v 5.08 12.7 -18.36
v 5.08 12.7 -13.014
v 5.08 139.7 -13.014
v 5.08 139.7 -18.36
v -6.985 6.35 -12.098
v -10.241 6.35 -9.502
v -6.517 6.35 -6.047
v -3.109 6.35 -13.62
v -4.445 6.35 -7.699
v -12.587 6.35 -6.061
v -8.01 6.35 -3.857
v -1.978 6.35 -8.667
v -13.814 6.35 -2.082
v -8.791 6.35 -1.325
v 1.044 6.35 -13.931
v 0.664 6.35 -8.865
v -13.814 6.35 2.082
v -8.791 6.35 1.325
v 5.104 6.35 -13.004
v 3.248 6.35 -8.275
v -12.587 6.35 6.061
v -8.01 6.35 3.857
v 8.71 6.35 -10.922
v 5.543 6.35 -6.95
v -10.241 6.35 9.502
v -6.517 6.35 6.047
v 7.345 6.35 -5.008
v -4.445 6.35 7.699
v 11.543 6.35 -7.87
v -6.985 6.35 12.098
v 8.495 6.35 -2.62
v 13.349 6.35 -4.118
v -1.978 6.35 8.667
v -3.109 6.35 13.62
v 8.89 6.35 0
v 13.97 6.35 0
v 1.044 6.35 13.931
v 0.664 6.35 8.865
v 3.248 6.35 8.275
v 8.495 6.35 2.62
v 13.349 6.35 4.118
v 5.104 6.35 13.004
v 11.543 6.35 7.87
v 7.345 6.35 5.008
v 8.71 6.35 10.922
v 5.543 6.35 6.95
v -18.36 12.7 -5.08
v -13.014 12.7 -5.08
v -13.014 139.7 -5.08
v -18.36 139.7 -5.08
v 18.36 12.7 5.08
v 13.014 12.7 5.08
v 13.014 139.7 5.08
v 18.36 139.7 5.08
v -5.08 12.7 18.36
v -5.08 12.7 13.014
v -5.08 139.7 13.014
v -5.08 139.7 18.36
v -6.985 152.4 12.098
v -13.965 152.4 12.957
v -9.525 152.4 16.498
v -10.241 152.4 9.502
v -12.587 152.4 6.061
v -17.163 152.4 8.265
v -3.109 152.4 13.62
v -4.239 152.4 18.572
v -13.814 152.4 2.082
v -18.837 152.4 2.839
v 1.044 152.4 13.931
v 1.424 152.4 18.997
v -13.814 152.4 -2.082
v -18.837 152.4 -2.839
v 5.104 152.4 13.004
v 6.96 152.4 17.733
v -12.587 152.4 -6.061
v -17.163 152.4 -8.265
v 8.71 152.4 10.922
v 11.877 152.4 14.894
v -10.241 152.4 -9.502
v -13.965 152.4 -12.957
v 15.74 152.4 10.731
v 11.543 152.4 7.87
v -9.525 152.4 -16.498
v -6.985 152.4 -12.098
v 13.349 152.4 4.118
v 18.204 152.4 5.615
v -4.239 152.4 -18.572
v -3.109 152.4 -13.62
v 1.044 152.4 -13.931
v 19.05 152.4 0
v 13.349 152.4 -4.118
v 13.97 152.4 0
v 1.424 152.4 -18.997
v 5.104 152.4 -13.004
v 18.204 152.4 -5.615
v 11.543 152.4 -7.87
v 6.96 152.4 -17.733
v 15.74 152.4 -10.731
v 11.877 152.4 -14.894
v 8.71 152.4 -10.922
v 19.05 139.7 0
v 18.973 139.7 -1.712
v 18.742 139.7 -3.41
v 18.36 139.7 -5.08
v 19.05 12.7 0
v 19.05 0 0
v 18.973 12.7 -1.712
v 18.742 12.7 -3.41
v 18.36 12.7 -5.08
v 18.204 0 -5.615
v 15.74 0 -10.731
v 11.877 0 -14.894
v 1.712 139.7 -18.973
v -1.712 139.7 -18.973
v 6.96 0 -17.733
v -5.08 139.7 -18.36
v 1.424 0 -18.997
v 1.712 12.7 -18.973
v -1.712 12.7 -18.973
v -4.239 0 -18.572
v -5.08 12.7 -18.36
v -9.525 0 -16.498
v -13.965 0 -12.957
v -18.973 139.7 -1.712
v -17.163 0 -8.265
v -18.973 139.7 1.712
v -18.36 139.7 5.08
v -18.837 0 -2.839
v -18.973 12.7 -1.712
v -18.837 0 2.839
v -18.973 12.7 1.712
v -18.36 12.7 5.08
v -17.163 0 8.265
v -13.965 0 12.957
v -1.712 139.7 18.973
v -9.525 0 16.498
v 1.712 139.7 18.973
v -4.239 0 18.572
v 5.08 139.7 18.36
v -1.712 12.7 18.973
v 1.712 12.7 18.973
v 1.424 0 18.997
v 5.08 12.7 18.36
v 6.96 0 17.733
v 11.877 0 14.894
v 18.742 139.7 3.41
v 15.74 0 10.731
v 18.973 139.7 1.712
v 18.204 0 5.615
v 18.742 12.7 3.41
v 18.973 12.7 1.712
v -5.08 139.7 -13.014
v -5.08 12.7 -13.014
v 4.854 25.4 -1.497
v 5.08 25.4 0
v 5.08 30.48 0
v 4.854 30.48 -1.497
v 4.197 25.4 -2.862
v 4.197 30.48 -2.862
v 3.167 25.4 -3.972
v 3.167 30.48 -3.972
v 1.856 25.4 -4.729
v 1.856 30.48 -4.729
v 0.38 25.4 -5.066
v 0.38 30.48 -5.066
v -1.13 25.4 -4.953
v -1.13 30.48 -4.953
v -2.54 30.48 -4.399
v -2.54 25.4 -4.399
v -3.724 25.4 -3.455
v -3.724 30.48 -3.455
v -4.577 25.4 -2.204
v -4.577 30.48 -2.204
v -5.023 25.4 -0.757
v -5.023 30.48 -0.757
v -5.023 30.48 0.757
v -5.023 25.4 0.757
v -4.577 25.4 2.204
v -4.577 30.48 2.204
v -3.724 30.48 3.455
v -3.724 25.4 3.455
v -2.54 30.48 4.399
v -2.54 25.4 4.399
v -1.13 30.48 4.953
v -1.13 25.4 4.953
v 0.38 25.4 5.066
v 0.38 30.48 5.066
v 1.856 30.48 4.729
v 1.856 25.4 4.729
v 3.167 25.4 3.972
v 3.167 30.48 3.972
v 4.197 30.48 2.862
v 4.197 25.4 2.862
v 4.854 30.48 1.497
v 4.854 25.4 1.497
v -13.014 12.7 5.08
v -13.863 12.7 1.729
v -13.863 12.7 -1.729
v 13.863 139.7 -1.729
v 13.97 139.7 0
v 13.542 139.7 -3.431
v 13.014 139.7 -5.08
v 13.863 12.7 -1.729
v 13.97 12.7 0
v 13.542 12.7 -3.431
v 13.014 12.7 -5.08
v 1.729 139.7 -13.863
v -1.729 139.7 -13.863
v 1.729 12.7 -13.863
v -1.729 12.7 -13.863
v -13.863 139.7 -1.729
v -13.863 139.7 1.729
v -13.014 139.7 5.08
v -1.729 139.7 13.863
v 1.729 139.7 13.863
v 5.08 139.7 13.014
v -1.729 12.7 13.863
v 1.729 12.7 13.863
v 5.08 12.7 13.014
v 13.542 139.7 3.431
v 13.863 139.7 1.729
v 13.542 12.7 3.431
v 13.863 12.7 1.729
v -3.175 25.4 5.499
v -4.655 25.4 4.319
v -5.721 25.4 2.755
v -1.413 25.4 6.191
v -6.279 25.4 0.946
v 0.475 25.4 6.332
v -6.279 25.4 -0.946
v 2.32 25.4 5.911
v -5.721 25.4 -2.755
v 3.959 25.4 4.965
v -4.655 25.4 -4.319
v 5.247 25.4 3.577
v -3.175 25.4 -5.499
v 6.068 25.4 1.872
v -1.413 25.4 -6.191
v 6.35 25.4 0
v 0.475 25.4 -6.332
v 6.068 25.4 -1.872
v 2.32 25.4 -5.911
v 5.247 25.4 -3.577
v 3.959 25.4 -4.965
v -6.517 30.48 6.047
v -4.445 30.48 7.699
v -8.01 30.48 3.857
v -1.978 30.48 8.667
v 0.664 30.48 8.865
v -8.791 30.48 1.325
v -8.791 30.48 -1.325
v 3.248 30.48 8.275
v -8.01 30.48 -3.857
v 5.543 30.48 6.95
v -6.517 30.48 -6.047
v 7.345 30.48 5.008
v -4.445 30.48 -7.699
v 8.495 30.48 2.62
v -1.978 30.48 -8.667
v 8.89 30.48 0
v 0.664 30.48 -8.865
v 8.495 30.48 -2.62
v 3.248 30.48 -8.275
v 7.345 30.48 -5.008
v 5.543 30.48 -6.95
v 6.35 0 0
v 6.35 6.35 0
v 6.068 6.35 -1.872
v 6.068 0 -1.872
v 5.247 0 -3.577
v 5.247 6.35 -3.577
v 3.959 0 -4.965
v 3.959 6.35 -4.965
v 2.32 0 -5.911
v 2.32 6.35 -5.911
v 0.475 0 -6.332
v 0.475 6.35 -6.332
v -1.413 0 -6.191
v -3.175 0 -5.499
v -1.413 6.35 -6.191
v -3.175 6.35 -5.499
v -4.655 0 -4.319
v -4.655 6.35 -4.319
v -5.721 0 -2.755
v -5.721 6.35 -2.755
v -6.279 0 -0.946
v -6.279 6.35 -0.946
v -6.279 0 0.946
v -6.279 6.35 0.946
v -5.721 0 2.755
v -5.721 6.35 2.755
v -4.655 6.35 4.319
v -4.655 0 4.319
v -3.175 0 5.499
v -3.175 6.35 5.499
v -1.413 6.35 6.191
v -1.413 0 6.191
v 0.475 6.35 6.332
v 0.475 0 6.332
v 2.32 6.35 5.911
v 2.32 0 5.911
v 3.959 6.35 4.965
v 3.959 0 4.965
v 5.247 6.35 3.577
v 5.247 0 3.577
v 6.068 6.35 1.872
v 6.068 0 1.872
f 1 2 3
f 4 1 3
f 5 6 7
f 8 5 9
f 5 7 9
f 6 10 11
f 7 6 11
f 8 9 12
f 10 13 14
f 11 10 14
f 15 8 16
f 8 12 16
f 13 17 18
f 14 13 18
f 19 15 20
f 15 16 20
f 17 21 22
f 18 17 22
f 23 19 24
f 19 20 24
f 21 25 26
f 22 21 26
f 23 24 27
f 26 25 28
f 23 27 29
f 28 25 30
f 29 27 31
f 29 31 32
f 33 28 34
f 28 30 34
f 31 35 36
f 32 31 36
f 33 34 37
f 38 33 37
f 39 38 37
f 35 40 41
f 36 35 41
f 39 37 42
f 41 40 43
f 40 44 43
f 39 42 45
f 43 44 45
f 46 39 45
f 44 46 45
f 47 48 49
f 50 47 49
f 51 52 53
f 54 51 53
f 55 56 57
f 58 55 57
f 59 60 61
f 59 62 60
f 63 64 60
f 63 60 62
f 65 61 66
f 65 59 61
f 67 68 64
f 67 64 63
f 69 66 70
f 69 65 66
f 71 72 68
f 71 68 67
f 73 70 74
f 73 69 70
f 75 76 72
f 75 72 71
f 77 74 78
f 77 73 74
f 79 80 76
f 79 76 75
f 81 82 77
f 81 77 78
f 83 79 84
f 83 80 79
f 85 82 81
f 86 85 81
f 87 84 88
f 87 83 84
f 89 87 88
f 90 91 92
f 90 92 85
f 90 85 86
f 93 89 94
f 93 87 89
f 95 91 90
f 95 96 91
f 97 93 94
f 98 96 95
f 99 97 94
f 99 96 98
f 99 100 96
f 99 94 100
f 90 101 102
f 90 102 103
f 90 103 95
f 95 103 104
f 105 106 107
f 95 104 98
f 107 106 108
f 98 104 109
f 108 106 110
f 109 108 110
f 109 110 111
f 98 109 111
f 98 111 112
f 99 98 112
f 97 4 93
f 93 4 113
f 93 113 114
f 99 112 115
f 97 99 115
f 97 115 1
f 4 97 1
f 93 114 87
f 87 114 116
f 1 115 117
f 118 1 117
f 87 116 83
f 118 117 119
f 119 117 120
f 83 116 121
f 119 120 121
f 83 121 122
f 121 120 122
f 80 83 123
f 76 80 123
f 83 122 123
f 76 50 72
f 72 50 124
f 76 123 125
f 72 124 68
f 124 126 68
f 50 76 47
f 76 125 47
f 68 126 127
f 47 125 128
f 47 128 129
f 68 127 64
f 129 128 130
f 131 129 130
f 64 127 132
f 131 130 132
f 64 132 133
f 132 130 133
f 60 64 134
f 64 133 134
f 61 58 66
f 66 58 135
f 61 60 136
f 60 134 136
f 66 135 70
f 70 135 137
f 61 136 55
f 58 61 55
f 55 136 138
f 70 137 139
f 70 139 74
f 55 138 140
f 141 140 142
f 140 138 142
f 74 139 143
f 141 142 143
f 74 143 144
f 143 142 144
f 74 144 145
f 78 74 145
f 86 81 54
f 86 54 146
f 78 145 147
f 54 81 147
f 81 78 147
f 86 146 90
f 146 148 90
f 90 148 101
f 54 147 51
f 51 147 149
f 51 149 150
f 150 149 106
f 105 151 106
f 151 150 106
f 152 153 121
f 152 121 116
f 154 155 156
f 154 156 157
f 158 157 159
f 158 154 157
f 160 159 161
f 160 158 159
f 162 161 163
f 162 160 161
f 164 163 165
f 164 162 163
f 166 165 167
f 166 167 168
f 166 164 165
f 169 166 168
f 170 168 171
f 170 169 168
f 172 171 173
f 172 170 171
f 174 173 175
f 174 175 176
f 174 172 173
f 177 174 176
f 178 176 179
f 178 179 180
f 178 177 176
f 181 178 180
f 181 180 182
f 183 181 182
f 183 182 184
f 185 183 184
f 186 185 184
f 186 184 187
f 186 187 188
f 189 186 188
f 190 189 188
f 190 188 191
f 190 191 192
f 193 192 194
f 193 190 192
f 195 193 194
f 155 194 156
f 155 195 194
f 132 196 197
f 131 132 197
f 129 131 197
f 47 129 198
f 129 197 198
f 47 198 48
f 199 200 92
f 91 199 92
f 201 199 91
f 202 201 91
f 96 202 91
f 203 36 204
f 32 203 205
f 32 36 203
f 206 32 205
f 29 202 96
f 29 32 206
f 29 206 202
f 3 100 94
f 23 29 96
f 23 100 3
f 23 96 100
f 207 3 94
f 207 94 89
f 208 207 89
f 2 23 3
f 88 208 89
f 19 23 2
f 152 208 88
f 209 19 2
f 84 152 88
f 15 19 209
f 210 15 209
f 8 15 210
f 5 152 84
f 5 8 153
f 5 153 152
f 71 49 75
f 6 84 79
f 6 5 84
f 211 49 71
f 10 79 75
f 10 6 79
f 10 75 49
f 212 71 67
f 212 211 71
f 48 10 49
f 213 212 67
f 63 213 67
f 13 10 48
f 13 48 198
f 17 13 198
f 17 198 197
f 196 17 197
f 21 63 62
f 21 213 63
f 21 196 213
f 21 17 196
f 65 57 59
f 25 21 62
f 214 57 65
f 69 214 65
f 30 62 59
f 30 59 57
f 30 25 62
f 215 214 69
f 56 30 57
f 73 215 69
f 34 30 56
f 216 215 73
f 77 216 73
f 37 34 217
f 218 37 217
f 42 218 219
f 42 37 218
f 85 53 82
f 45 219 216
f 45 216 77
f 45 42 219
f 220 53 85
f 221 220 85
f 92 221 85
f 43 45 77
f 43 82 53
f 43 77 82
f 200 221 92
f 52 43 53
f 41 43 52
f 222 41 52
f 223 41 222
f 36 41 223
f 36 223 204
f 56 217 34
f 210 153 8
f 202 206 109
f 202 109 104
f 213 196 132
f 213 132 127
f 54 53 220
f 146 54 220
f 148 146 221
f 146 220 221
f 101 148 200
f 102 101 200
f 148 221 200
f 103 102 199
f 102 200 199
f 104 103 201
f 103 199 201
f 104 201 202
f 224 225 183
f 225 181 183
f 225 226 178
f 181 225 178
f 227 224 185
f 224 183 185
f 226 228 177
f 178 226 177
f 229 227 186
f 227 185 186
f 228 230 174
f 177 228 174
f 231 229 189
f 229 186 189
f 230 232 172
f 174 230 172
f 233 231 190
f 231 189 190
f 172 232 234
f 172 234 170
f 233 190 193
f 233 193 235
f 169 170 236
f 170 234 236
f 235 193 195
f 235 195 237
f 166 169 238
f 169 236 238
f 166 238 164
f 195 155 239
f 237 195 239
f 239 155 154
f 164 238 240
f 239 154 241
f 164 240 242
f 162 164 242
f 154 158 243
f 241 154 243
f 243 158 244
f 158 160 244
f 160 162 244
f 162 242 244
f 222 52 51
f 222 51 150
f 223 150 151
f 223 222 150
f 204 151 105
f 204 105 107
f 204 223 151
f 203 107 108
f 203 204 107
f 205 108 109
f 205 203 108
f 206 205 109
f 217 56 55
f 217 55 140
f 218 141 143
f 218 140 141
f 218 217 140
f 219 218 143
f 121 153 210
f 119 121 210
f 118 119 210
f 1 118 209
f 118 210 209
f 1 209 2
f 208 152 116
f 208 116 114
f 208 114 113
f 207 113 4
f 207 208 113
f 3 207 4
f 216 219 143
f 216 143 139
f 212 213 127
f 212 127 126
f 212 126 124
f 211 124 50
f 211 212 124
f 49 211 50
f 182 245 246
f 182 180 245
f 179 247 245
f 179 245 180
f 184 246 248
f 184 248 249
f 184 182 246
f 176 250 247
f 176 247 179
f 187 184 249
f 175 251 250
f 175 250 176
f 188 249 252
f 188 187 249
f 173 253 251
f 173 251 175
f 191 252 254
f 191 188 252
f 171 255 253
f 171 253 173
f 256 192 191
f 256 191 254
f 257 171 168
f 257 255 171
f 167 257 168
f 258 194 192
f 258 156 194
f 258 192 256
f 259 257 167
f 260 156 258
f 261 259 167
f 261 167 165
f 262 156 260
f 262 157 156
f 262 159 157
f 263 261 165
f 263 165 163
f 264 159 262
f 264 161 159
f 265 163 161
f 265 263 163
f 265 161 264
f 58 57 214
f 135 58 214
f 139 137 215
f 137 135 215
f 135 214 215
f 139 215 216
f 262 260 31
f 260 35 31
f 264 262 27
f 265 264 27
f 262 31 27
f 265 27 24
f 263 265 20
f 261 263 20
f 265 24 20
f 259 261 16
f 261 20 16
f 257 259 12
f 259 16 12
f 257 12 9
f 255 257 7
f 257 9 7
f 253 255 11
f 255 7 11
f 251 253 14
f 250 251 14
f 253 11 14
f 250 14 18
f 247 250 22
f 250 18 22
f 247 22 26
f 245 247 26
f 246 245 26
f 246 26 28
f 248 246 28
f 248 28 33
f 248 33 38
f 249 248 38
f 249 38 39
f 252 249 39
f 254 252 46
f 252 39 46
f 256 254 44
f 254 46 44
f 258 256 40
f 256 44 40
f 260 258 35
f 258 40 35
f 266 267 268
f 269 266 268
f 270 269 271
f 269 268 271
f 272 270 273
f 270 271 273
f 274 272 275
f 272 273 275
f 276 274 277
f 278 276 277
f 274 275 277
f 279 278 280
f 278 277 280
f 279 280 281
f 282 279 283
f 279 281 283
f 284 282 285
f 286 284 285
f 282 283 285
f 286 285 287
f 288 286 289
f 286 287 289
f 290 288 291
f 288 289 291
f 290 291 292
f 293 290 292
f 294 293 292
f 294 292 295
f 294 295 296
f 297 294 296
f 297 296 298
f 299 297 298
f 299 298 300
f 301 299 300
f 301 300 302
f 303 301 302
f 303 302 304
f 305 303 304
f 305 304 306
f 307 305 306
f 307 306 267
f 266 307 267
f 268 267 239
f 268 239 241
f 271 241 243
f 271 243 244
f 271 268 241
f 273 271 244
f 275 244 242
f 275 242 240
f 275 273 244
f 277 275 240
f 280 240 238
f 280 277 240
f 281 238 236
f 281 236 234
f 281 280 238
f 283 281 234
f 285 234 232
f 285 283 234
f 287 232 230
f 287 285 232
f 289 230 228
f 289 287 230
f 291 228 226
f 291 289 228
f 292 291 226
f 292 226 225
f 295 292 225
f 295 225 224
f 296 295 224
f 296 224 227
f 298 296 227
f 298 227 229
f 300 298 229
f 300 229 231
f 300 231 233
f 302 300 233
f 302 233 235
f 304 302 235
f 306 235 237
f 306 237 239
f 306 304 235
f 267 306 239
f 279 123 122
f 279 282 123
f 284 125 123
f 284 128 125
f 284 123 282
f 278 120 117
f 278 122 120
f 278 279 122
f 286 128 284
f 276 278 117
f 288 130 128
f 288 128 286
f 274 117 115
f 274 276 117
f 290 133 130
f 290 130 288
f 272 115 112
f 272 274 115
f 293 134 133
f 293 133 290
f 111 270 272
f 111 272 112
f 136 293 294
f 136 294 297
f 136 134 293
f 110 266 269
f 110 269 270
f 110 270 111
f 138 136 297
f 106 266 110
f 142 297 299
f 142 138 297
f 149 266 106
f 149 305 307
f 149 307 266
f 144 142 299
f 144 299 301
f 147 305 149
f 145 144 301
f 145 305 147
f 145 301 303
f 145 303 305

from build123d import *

# Parameters (mm, degrees)
SKETCH1_R               = 19.05
SKETCH1_R_2             = 13.97
BOSS_EXTRUDE1_DEPTH     = 152.4
SKETCH2_R               = 13.97
BOSS_EXTRUDE2_DEPTH     = 6.35
SKETCH3_R               = 2.2479
CUT_EXTRUDE1_DEPTH      = 3.54
CUT_EXTRUDE1_DEPTH_BACK = 36.56
SKETCH5_W               = 10.16
SKETCH5_H               = 127
CUT_EXTRUDE5_DEPTH      = 20.0500001
CUT_EXTRUDE5_DEPTH_BACK = 20.0500001
SKETCH8_W               = 10.16
SKETCH8_H               = 127
CUT_EXTRUDE6_DEPTH      = 20.050000101
CUT_EXTRUDE6_DEPTH_BACK = 20.050000101
SKETCH7_R               = 6.35
CUT_EXTRUDE4_DEPTH      = 7.35
SKETCH9_R               = 8.89
SKETCH9_R_2             = 6.35
BOSS_EXTRUDE3_DEPTH     = 19.05
SKETCH10_R              = 8.89
SKETCH10_R_2            = 5.08
BOSS_EXTRUDE4_DEPTH     = 5.08


with BuildPart() as part:
    # Sketch1 → Boss-Extrude1 (new body)
    with BuildSketch(Plane(origin=(0, 0, 0), x_dir=(1, 0, 0), z_dir=(0, 1, 0))):
        Circle(SKETCH1_R)
        Circle(SKETCH1_R_2, mode=Mode.SUBTRACT)
    extrude(amount=BOSS_EXTRUDE1_DEPTH)

    # Sketch2 → Boss-Extrude2 (add)
    with BuildSketch(Plane.XZ):
        Circle(SKETCH2_R)
    extrude(amount=-BOSS_EXTRUDE2_DEPTH)

    # Sketch3 → Cut-Extrude1 (cut, two sides)
    with BuildSketch(Plane.XY.offset(16.51)) as cut_extrude1_sk:
        with Locations((0, 101.6)):
            Circle(SKETCH3_R)
    extrude(amount=CUT_EXTRUDE1_DEPTH, mode=Mode.SUBTRACT)
    extrude(cut_extrude1_sk.sketch, amount=-CUT_EXTRUDE1_DEPTH_BACK, mode=Mode.SUBTRACT)

    # Sketch5 → Cut-Extrude5 (cut, two sides)
    with BuildSketch(Plane(origin=(0, 0, 0), x_dir=(0, 0, -1), z_dir=(1, 0, 0))) as cut_extrude5_sk:
        with Locations((0, 76.2)):
            Rectangle(SKETCH5_W, SKETCH5_H)
    extrude(amount=CUT_EXTRUDE5_DEPTH, mode=Mode.SUBTRACT)
    extrude(cut_extrude5_sk.sketch, amount=-CUT_EXTRUDE5_DEPTH_BACK, mode=Mode.SUBTRACT)

    # Sketch8 → Cut-Extrude6 (cut, two sides)
    with BuildSketch(Plane.XY) as cut_extrude6_sk:
        with Locations((0, 76.2)):
            Rectangle(SKETCH8_W, SKETCH8_H)
    extrude(amount=CUT_EXTRUDE6_DEPTH, mode=Mode.SUBTRACT)
    extrude(cut_extrude6_sk.sketch, amount=-CUT_EXTRUDE6_DEPTH_BACK, mode=Mode.SUBTRACT)

    # Sketch7 → Cut-Extrude4 (cut, through all)
    with BuildSketch(Plane(origin=(0, 6.35, 0), x_dir=(1, 0, 0), z_dir=(0, 1, 0))):
        Circle(SKETCH7_R)
    extrude(amount=-CUT_EXTRUDE4_DEPTH, mode=Mode.SUBTRACT)

    # Sketch9 → Boss-Extrude3 (add)
    with BuildSketch(Plane(origin=(0, 6.35, 0), x_dir=(1, 0, 0), z_dir=(0, 1, 0))):
        Circle(SKETCH9_R)
        Circle(SKETCH9_R_2, mode=Mode.SUBTRACT)
    extrude(amount=BOSS_EXTRUDE3_DEPTH)

    # Sketch10 → Boss-Extrude4 (add)
    with BuildSketch(Plane(origin=(0, 25.4, 0), x_dir=(1, 0, 0), z_dir=(0, 1, 0))):
        Circle(SKETCH10_R)
        Circle(SKETCH10_R_2, mode=Mode.SUBTRACT)
    extrude(amount=BOSS_EXTRUDE4_DEPTH)


solid = part.part
